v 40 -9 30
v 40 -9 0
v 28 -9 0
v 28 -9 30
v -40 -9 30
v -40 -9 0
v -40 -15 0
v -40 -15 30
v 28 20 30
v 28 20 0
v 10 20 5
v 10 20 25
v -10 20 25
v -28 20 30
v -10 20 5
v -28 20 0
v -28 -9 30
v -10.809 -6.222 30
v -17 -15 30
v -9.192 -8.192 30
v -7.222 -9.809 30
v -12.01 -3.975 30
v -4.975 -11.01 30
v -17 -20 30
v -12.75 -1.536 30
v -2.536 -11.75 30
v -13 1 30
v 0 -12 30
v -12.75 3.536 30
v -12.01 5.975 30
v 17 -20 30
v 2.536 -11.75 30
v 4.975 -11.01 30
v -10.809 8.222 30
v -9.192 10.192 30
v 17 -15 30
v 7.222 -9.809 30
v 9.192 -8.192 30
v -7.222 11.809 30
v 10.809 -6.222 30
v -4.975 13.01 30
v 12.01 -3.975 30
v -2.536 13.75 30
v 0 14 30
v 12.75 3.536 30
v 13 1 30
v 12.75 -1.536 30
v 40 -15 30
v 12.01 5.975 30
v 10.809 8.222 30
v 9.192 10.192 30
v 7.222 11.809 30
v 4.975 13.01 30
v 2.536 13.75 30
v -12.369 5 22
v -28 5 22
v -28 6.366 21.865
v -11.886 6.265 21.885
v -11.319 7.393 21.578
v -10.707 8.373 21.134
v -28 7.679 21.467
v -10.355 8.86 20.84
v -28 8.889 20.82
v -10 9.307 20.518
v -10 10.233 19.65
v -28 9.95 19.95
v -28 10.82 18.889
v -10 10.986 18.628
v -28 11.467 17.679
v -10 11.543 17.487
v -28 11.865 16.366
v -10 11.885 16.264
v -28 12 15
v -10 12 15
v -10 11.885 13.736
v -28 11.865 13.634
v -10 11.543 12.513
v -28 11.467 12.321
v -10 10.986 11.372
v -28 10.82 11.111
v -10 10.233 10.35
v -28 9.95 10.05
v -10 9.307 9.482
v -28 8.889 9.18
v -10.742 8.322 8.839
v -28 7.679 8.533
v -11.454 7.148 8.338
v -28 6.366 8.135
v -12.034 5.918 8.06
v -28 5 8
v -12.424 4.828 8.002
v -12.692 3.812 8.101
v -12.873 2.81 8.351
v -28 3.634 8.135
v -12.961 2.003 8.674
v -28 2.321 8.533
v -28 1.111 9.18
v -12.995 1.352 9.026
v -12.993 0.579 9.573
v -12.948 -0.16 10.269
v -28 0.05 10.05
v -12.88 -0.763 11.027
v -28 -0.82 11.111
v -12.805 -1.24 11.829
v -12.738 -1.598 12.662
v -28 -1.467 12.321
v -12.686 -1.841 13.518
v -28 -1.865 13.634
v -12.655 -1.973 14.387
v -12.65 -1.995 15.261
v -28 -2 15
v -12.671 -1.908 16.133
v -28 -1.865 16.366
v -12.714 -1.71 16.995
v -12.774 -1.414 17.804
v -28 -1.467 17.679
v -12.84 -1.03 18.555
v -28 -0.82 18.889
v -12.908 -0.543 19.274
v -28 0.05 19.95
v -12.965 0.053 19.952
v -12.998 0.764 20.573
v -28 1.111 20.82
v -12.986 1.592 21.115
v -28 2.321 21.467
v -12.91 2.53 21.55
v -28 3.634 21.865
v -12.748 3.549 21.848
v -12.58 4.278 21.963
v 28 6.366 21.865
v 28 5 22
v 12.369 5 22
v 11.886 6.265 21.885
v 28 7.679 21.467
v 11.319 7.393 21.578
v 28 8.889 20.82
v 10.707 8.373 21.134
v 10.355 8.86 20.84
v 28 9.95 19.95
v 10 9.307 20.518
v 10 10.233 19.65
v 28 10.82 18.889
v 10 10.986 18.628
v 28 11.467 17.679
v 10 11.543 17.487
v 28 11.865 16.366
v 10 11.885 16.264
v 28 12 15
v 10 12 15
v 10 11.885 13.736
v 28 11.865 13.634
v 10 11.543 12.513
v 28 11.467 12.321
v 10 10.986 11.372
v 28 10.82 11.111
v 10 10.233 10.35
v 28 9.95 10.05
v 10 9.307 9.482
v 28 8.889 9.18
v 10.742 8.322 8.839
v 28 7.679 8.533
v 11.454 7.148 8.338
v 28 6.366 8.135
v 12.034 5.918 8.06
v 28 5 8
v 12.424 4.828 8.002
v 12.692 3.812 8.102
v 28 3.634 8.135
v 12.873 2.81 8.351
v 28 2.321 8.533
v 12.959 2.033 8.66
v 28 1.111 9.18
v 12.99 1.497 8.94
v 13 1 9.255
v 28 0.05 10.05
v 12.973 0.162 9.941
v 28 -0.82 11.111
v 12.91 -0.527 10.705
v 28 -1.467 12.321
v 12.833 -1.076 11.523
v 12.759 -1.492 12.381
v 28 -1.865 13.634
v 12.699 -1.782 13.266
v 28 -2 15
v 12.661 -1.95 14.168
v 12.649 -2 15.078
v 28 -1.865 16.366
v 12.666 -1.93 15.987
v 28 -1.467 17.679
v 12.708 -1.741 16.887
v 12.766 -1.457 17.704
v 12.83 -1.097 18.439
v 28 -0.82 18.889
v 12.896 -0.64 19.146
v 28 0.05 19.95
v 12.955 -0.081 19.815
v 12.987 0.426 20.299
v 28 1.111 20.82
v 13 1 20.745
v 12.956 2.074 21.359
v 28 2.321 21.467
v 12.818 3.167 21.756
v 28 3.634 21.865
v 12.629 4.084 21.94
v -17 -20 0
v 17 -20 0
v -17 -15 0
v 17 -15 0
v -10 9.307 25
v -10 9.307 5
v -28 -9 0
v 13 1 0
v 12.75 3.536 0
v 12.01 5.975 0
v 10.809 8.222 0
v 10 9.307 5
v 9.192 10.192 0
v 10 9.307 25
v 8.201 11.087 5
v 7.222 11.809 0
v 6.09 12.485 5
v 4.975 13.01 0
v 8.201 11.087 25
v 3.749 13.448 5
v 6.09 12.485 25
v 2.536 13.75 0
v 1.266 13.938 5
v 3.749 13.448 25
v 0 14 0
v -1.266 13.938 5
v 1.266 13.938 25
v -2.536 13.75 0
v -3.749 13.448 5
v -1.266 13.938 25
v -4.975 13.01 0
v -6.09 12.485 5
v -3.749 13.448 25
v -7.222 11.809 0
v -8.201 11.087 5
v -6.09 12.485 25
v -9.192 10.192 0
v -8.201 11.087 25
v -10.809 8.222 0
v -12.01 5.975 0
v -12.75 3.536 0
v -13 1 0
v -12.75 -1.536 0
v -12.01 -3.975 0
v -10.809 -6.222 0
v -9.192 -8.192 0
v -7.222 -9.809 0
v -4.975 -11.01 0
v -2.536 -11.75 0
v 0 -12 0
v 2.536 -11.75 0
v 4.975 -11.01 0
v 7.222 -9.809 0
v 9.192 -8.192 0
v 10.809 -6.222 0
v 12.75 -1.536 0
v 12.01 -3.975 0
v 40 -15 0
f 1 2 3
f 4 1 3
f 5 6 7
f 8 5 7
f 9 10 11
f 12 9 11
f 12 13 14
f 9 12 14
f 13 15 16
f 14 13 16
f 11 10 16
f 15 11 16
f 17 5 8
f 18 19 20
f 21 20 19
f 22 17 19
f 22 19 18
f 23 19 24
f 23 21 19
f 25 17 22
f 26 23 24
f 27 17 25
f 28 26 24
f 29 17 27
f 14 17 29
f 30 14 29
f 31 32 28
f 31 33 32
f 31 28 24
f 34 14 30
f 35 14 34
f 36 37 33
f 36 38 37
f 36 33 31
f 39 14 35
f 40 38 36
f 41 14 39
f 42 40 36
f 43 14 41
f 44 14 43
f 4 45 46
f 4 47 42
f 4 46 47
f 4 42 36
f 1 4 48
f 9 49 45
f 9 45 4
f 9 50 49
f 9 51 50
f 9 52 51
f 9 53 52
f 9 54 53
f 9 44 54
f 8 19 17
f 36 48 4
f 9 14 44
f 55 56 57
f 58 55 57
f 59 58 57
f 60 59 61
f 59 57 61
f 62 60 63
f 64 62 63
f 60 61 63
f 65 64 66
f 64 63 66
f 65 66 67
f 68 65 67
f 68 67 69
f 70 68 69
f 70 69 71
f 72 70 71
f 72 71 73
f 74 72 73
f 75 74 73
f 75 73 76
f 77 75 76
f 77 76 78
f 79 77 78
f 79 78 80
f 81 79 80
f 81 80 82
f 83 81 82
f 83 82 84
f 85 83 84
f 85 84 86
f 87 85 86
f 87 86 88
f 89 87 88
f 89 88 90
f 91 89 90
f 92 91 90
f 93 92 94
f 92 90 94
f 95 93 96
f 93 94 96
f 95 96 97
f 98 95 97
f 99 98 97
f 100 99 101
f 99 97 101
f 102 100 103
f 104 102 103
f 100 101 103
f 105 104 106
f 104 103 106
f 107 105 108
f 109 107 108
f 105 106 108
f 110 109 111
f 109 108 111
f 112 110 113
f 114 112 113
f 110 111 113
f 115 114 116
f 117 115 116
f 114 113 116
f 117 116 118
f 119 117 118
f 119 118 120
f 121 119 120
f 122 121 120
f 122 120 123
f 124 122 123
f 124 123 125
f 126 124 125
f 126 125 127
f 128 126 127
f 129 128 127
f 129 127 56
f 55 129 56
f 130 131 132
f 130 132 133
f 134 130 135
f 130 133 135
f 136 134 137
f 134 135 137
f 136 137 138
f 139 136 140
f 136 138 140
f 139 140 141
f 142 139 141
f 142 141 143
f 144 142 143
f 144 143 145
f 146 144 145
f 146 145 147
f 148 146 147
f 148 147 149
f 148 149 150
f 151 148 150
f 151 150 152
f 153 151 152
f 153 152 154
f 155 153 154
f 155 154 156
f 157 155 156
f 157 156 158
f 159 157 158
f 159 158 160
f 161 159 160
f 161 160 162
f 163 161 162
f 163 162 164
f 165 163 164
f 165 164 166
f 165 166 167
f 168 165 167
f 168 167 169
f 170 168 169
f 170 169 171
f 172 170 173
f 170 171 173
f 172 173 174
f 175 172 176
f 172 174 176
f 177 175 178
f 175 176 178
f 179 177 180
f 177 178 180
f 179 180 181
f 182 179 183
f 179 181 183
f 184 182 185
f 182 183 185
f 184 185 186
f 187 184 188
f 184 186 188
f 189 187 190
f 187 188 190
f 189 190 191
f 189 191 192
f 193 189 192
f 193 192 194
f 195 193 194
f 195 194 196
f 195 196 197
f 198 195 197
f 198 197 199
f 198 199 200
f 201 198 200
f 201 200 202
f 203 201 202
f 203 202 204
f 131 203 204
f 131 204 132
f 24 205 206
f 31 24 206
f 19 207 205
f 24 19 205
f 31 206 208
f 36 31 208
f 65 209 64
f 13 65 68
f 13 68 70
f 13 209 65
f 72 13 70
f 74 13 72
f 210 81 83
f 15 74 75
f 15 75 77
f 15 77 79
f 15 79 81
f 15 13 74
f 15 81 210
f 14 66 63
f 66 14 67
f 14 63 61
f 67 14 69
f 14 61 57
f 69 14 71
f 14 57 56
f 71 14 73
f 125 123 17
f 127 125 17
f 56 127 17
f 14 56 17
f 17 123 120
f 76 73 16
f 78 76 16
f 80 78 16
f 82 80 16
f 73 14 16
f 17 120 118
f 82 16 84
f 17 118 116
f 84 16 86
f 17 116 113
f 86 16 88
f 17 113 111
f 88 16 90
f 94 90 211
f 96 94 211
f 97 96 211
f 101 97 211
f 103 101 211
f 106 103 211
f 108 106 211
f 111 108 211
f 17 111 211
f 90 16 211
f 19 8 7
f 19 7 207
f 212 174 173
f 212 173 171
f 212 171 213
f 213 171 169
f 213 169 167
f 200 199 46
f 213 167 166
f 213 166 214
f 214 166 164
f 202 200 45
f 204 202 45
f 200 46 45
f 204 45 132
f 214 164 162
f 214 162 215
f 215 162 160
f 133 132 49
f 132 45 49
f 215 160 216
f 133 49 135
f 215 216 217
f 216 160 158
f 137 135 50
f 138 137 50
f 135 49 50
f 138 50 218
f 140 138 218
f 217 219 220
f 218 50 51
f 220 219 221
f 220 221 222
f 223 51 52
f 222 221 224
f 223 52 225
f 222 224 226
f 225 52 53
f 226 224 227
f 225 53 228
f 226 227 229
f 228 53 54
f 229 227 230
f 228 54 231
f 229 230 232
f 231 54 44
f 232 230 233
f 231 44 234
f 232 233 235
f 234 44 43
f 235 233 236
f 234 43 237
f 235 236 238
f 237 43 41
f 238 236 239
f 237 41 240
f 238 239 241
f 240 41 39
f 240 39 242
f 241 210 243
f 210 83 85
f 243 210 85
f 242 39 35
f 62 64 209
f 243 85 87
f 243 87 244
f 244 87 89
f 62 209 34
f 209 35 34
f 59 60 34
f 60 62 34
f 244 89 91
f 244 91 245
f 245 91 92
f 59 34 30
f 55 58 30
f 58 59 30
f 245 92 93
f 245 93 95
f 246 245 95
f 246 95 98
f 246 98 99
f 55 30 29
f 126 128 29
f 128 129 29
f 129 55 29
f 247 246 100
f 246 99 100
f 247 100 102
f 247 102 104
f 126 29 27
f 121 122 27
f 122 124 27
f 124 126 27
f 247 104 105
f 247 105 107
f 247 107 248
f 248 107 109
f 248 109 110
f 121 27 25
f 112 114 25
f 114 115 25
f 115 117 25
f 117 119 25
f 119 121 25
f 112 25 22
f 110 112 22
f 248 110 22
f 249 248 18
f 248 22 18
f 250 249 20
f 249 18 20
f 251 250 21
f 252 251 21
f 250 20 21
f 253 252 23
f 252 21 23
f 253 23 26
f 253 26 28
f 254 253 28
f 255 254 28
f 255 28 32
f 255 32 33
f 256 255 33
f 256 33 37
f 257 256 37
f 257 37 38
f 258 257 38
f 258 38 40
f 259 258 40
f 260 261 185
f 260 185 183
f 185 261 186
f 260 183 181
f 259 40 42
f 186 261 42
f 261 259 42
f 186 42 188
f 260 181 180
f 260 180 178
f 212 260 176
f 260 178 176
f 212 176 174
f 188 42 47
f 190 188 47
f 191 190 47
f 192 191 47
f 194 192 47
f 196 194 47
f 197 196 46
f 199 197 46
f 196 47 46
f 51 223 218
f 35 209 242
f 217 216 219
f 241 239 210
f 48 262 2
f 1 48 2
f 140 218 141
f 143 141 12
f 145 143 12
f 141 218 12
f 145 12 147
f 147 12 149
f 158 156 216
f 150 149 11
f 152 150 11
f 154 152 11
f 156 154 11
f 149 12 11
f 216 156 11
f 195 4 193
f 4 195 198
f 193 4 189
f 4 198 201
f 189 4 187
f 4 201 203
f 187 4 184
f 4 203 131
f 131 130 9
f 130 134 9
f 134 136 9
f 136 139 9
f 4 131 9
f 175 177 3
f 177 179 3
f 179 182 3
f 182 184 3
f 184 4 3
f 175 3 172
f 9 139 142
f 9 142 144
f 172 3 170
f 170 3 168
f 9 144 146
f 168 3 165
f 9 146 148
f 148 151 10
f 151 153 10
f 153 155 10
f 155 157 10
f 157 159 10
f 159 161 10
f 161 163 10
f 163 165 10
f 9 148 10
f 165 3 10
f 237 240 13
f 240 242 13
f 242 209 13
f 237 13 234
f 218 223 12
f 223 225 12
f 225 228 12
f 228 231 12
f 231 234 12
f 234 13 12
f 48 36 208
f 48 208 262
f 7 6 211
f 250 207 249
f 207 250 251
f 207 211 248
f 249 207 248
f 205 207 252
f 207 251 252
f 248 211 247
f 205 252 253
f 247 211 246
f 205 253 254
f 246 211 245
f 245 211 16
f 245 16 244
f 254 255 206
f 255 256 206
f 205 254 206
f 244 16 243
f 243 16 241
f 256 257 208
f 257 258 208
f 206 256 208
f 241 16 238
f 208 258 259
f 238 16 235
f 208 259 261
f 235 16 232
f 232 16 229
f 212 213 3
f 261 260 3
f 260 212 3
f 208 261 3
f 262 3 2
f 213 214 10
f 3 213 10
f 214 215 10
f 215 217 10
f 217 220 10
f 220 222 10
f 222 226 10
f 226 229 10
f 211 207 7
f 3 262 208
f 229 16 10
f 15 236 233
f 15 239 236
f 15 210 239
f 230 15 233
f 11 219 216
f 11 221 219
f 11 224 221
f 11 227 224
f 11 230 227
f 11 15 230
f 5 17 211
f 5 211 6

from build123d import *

# Parameters (mm, degrees)
EXTRUDE_1_DEPTH     = 30
SKETCH_2_R          = 13
CUT_EXTRUDE_1_DEPTH = 54.851648071
SKETCH_3_R          = 7
CUT_EXTRUDE_2_DEPTH = 77.96752562
CUT_EXTRUDE_3_REACH = 66.031
SKETCH_4_W          = 20
SKETCH_4_H          = 20


with BuildPart() as part:
    # Эскиз1 → Бобышка-Вытянуть1 (new body)
    with BuildSketch(Plane.XY):
        Polygon((-40, -15), (-17, -15), (-17, -20), (17, -20), (17, -15), (40, -15), (40, -9), (28, -9), (28, 20), (-28, 20), (-28, -9), (-40, -9), align=None)
    extrude(amount=EXTRUDE_1_DEPTH)

    # Эскиз2 → Вырез-Вытянуть1 (cut, through all)
    with BuildSketch(Plane.XY.offset(30)):
        with Locations((0, 1)):
            Circle(SKETCH_2_R)
    extrude(amount=-CUT_EXTRUDE_1_DEPTH, mode=Mode.SUBTRACT)

    # Эскиз3 → Вырез-Вытянуть2 (cut, through all)
    with BuildSketch(Plane.ZY.offset(28)):
        with Locations((15, 5)):
            Circle(SKETCH_3_R)
    extrude(amount=-CUT_EXTRUDE_2_DEPTH, mode=Mode.SUBTRACT)

    # Эскиз4 → Вырез-Вытянуть3 (cut, up to next)
    with BuildSketch(Plane(origin=(0, 20, 0), x_dir=(1, 0, 0), z_dir=(0, 1, 0)), mode=Mode.PRIVATE) as cut_extrude_3_sk1:
        with Locations((0, -15)):
            Rectangle(SKETCH_4_W, SKETCH_4_H)
    cut_extrude_3_tool1 = extrude(cut_extrude_3_sk1.sketch, amount=-CUT_EXTRUDE_3_REACH, mode=Mode.PRIVATE) & part.part
    add(cut_extrude_3_tool1.solids().sort_by_distance((0, 20, 15))[0], mode=Mode.SUBTRACT)


solid = part.part
